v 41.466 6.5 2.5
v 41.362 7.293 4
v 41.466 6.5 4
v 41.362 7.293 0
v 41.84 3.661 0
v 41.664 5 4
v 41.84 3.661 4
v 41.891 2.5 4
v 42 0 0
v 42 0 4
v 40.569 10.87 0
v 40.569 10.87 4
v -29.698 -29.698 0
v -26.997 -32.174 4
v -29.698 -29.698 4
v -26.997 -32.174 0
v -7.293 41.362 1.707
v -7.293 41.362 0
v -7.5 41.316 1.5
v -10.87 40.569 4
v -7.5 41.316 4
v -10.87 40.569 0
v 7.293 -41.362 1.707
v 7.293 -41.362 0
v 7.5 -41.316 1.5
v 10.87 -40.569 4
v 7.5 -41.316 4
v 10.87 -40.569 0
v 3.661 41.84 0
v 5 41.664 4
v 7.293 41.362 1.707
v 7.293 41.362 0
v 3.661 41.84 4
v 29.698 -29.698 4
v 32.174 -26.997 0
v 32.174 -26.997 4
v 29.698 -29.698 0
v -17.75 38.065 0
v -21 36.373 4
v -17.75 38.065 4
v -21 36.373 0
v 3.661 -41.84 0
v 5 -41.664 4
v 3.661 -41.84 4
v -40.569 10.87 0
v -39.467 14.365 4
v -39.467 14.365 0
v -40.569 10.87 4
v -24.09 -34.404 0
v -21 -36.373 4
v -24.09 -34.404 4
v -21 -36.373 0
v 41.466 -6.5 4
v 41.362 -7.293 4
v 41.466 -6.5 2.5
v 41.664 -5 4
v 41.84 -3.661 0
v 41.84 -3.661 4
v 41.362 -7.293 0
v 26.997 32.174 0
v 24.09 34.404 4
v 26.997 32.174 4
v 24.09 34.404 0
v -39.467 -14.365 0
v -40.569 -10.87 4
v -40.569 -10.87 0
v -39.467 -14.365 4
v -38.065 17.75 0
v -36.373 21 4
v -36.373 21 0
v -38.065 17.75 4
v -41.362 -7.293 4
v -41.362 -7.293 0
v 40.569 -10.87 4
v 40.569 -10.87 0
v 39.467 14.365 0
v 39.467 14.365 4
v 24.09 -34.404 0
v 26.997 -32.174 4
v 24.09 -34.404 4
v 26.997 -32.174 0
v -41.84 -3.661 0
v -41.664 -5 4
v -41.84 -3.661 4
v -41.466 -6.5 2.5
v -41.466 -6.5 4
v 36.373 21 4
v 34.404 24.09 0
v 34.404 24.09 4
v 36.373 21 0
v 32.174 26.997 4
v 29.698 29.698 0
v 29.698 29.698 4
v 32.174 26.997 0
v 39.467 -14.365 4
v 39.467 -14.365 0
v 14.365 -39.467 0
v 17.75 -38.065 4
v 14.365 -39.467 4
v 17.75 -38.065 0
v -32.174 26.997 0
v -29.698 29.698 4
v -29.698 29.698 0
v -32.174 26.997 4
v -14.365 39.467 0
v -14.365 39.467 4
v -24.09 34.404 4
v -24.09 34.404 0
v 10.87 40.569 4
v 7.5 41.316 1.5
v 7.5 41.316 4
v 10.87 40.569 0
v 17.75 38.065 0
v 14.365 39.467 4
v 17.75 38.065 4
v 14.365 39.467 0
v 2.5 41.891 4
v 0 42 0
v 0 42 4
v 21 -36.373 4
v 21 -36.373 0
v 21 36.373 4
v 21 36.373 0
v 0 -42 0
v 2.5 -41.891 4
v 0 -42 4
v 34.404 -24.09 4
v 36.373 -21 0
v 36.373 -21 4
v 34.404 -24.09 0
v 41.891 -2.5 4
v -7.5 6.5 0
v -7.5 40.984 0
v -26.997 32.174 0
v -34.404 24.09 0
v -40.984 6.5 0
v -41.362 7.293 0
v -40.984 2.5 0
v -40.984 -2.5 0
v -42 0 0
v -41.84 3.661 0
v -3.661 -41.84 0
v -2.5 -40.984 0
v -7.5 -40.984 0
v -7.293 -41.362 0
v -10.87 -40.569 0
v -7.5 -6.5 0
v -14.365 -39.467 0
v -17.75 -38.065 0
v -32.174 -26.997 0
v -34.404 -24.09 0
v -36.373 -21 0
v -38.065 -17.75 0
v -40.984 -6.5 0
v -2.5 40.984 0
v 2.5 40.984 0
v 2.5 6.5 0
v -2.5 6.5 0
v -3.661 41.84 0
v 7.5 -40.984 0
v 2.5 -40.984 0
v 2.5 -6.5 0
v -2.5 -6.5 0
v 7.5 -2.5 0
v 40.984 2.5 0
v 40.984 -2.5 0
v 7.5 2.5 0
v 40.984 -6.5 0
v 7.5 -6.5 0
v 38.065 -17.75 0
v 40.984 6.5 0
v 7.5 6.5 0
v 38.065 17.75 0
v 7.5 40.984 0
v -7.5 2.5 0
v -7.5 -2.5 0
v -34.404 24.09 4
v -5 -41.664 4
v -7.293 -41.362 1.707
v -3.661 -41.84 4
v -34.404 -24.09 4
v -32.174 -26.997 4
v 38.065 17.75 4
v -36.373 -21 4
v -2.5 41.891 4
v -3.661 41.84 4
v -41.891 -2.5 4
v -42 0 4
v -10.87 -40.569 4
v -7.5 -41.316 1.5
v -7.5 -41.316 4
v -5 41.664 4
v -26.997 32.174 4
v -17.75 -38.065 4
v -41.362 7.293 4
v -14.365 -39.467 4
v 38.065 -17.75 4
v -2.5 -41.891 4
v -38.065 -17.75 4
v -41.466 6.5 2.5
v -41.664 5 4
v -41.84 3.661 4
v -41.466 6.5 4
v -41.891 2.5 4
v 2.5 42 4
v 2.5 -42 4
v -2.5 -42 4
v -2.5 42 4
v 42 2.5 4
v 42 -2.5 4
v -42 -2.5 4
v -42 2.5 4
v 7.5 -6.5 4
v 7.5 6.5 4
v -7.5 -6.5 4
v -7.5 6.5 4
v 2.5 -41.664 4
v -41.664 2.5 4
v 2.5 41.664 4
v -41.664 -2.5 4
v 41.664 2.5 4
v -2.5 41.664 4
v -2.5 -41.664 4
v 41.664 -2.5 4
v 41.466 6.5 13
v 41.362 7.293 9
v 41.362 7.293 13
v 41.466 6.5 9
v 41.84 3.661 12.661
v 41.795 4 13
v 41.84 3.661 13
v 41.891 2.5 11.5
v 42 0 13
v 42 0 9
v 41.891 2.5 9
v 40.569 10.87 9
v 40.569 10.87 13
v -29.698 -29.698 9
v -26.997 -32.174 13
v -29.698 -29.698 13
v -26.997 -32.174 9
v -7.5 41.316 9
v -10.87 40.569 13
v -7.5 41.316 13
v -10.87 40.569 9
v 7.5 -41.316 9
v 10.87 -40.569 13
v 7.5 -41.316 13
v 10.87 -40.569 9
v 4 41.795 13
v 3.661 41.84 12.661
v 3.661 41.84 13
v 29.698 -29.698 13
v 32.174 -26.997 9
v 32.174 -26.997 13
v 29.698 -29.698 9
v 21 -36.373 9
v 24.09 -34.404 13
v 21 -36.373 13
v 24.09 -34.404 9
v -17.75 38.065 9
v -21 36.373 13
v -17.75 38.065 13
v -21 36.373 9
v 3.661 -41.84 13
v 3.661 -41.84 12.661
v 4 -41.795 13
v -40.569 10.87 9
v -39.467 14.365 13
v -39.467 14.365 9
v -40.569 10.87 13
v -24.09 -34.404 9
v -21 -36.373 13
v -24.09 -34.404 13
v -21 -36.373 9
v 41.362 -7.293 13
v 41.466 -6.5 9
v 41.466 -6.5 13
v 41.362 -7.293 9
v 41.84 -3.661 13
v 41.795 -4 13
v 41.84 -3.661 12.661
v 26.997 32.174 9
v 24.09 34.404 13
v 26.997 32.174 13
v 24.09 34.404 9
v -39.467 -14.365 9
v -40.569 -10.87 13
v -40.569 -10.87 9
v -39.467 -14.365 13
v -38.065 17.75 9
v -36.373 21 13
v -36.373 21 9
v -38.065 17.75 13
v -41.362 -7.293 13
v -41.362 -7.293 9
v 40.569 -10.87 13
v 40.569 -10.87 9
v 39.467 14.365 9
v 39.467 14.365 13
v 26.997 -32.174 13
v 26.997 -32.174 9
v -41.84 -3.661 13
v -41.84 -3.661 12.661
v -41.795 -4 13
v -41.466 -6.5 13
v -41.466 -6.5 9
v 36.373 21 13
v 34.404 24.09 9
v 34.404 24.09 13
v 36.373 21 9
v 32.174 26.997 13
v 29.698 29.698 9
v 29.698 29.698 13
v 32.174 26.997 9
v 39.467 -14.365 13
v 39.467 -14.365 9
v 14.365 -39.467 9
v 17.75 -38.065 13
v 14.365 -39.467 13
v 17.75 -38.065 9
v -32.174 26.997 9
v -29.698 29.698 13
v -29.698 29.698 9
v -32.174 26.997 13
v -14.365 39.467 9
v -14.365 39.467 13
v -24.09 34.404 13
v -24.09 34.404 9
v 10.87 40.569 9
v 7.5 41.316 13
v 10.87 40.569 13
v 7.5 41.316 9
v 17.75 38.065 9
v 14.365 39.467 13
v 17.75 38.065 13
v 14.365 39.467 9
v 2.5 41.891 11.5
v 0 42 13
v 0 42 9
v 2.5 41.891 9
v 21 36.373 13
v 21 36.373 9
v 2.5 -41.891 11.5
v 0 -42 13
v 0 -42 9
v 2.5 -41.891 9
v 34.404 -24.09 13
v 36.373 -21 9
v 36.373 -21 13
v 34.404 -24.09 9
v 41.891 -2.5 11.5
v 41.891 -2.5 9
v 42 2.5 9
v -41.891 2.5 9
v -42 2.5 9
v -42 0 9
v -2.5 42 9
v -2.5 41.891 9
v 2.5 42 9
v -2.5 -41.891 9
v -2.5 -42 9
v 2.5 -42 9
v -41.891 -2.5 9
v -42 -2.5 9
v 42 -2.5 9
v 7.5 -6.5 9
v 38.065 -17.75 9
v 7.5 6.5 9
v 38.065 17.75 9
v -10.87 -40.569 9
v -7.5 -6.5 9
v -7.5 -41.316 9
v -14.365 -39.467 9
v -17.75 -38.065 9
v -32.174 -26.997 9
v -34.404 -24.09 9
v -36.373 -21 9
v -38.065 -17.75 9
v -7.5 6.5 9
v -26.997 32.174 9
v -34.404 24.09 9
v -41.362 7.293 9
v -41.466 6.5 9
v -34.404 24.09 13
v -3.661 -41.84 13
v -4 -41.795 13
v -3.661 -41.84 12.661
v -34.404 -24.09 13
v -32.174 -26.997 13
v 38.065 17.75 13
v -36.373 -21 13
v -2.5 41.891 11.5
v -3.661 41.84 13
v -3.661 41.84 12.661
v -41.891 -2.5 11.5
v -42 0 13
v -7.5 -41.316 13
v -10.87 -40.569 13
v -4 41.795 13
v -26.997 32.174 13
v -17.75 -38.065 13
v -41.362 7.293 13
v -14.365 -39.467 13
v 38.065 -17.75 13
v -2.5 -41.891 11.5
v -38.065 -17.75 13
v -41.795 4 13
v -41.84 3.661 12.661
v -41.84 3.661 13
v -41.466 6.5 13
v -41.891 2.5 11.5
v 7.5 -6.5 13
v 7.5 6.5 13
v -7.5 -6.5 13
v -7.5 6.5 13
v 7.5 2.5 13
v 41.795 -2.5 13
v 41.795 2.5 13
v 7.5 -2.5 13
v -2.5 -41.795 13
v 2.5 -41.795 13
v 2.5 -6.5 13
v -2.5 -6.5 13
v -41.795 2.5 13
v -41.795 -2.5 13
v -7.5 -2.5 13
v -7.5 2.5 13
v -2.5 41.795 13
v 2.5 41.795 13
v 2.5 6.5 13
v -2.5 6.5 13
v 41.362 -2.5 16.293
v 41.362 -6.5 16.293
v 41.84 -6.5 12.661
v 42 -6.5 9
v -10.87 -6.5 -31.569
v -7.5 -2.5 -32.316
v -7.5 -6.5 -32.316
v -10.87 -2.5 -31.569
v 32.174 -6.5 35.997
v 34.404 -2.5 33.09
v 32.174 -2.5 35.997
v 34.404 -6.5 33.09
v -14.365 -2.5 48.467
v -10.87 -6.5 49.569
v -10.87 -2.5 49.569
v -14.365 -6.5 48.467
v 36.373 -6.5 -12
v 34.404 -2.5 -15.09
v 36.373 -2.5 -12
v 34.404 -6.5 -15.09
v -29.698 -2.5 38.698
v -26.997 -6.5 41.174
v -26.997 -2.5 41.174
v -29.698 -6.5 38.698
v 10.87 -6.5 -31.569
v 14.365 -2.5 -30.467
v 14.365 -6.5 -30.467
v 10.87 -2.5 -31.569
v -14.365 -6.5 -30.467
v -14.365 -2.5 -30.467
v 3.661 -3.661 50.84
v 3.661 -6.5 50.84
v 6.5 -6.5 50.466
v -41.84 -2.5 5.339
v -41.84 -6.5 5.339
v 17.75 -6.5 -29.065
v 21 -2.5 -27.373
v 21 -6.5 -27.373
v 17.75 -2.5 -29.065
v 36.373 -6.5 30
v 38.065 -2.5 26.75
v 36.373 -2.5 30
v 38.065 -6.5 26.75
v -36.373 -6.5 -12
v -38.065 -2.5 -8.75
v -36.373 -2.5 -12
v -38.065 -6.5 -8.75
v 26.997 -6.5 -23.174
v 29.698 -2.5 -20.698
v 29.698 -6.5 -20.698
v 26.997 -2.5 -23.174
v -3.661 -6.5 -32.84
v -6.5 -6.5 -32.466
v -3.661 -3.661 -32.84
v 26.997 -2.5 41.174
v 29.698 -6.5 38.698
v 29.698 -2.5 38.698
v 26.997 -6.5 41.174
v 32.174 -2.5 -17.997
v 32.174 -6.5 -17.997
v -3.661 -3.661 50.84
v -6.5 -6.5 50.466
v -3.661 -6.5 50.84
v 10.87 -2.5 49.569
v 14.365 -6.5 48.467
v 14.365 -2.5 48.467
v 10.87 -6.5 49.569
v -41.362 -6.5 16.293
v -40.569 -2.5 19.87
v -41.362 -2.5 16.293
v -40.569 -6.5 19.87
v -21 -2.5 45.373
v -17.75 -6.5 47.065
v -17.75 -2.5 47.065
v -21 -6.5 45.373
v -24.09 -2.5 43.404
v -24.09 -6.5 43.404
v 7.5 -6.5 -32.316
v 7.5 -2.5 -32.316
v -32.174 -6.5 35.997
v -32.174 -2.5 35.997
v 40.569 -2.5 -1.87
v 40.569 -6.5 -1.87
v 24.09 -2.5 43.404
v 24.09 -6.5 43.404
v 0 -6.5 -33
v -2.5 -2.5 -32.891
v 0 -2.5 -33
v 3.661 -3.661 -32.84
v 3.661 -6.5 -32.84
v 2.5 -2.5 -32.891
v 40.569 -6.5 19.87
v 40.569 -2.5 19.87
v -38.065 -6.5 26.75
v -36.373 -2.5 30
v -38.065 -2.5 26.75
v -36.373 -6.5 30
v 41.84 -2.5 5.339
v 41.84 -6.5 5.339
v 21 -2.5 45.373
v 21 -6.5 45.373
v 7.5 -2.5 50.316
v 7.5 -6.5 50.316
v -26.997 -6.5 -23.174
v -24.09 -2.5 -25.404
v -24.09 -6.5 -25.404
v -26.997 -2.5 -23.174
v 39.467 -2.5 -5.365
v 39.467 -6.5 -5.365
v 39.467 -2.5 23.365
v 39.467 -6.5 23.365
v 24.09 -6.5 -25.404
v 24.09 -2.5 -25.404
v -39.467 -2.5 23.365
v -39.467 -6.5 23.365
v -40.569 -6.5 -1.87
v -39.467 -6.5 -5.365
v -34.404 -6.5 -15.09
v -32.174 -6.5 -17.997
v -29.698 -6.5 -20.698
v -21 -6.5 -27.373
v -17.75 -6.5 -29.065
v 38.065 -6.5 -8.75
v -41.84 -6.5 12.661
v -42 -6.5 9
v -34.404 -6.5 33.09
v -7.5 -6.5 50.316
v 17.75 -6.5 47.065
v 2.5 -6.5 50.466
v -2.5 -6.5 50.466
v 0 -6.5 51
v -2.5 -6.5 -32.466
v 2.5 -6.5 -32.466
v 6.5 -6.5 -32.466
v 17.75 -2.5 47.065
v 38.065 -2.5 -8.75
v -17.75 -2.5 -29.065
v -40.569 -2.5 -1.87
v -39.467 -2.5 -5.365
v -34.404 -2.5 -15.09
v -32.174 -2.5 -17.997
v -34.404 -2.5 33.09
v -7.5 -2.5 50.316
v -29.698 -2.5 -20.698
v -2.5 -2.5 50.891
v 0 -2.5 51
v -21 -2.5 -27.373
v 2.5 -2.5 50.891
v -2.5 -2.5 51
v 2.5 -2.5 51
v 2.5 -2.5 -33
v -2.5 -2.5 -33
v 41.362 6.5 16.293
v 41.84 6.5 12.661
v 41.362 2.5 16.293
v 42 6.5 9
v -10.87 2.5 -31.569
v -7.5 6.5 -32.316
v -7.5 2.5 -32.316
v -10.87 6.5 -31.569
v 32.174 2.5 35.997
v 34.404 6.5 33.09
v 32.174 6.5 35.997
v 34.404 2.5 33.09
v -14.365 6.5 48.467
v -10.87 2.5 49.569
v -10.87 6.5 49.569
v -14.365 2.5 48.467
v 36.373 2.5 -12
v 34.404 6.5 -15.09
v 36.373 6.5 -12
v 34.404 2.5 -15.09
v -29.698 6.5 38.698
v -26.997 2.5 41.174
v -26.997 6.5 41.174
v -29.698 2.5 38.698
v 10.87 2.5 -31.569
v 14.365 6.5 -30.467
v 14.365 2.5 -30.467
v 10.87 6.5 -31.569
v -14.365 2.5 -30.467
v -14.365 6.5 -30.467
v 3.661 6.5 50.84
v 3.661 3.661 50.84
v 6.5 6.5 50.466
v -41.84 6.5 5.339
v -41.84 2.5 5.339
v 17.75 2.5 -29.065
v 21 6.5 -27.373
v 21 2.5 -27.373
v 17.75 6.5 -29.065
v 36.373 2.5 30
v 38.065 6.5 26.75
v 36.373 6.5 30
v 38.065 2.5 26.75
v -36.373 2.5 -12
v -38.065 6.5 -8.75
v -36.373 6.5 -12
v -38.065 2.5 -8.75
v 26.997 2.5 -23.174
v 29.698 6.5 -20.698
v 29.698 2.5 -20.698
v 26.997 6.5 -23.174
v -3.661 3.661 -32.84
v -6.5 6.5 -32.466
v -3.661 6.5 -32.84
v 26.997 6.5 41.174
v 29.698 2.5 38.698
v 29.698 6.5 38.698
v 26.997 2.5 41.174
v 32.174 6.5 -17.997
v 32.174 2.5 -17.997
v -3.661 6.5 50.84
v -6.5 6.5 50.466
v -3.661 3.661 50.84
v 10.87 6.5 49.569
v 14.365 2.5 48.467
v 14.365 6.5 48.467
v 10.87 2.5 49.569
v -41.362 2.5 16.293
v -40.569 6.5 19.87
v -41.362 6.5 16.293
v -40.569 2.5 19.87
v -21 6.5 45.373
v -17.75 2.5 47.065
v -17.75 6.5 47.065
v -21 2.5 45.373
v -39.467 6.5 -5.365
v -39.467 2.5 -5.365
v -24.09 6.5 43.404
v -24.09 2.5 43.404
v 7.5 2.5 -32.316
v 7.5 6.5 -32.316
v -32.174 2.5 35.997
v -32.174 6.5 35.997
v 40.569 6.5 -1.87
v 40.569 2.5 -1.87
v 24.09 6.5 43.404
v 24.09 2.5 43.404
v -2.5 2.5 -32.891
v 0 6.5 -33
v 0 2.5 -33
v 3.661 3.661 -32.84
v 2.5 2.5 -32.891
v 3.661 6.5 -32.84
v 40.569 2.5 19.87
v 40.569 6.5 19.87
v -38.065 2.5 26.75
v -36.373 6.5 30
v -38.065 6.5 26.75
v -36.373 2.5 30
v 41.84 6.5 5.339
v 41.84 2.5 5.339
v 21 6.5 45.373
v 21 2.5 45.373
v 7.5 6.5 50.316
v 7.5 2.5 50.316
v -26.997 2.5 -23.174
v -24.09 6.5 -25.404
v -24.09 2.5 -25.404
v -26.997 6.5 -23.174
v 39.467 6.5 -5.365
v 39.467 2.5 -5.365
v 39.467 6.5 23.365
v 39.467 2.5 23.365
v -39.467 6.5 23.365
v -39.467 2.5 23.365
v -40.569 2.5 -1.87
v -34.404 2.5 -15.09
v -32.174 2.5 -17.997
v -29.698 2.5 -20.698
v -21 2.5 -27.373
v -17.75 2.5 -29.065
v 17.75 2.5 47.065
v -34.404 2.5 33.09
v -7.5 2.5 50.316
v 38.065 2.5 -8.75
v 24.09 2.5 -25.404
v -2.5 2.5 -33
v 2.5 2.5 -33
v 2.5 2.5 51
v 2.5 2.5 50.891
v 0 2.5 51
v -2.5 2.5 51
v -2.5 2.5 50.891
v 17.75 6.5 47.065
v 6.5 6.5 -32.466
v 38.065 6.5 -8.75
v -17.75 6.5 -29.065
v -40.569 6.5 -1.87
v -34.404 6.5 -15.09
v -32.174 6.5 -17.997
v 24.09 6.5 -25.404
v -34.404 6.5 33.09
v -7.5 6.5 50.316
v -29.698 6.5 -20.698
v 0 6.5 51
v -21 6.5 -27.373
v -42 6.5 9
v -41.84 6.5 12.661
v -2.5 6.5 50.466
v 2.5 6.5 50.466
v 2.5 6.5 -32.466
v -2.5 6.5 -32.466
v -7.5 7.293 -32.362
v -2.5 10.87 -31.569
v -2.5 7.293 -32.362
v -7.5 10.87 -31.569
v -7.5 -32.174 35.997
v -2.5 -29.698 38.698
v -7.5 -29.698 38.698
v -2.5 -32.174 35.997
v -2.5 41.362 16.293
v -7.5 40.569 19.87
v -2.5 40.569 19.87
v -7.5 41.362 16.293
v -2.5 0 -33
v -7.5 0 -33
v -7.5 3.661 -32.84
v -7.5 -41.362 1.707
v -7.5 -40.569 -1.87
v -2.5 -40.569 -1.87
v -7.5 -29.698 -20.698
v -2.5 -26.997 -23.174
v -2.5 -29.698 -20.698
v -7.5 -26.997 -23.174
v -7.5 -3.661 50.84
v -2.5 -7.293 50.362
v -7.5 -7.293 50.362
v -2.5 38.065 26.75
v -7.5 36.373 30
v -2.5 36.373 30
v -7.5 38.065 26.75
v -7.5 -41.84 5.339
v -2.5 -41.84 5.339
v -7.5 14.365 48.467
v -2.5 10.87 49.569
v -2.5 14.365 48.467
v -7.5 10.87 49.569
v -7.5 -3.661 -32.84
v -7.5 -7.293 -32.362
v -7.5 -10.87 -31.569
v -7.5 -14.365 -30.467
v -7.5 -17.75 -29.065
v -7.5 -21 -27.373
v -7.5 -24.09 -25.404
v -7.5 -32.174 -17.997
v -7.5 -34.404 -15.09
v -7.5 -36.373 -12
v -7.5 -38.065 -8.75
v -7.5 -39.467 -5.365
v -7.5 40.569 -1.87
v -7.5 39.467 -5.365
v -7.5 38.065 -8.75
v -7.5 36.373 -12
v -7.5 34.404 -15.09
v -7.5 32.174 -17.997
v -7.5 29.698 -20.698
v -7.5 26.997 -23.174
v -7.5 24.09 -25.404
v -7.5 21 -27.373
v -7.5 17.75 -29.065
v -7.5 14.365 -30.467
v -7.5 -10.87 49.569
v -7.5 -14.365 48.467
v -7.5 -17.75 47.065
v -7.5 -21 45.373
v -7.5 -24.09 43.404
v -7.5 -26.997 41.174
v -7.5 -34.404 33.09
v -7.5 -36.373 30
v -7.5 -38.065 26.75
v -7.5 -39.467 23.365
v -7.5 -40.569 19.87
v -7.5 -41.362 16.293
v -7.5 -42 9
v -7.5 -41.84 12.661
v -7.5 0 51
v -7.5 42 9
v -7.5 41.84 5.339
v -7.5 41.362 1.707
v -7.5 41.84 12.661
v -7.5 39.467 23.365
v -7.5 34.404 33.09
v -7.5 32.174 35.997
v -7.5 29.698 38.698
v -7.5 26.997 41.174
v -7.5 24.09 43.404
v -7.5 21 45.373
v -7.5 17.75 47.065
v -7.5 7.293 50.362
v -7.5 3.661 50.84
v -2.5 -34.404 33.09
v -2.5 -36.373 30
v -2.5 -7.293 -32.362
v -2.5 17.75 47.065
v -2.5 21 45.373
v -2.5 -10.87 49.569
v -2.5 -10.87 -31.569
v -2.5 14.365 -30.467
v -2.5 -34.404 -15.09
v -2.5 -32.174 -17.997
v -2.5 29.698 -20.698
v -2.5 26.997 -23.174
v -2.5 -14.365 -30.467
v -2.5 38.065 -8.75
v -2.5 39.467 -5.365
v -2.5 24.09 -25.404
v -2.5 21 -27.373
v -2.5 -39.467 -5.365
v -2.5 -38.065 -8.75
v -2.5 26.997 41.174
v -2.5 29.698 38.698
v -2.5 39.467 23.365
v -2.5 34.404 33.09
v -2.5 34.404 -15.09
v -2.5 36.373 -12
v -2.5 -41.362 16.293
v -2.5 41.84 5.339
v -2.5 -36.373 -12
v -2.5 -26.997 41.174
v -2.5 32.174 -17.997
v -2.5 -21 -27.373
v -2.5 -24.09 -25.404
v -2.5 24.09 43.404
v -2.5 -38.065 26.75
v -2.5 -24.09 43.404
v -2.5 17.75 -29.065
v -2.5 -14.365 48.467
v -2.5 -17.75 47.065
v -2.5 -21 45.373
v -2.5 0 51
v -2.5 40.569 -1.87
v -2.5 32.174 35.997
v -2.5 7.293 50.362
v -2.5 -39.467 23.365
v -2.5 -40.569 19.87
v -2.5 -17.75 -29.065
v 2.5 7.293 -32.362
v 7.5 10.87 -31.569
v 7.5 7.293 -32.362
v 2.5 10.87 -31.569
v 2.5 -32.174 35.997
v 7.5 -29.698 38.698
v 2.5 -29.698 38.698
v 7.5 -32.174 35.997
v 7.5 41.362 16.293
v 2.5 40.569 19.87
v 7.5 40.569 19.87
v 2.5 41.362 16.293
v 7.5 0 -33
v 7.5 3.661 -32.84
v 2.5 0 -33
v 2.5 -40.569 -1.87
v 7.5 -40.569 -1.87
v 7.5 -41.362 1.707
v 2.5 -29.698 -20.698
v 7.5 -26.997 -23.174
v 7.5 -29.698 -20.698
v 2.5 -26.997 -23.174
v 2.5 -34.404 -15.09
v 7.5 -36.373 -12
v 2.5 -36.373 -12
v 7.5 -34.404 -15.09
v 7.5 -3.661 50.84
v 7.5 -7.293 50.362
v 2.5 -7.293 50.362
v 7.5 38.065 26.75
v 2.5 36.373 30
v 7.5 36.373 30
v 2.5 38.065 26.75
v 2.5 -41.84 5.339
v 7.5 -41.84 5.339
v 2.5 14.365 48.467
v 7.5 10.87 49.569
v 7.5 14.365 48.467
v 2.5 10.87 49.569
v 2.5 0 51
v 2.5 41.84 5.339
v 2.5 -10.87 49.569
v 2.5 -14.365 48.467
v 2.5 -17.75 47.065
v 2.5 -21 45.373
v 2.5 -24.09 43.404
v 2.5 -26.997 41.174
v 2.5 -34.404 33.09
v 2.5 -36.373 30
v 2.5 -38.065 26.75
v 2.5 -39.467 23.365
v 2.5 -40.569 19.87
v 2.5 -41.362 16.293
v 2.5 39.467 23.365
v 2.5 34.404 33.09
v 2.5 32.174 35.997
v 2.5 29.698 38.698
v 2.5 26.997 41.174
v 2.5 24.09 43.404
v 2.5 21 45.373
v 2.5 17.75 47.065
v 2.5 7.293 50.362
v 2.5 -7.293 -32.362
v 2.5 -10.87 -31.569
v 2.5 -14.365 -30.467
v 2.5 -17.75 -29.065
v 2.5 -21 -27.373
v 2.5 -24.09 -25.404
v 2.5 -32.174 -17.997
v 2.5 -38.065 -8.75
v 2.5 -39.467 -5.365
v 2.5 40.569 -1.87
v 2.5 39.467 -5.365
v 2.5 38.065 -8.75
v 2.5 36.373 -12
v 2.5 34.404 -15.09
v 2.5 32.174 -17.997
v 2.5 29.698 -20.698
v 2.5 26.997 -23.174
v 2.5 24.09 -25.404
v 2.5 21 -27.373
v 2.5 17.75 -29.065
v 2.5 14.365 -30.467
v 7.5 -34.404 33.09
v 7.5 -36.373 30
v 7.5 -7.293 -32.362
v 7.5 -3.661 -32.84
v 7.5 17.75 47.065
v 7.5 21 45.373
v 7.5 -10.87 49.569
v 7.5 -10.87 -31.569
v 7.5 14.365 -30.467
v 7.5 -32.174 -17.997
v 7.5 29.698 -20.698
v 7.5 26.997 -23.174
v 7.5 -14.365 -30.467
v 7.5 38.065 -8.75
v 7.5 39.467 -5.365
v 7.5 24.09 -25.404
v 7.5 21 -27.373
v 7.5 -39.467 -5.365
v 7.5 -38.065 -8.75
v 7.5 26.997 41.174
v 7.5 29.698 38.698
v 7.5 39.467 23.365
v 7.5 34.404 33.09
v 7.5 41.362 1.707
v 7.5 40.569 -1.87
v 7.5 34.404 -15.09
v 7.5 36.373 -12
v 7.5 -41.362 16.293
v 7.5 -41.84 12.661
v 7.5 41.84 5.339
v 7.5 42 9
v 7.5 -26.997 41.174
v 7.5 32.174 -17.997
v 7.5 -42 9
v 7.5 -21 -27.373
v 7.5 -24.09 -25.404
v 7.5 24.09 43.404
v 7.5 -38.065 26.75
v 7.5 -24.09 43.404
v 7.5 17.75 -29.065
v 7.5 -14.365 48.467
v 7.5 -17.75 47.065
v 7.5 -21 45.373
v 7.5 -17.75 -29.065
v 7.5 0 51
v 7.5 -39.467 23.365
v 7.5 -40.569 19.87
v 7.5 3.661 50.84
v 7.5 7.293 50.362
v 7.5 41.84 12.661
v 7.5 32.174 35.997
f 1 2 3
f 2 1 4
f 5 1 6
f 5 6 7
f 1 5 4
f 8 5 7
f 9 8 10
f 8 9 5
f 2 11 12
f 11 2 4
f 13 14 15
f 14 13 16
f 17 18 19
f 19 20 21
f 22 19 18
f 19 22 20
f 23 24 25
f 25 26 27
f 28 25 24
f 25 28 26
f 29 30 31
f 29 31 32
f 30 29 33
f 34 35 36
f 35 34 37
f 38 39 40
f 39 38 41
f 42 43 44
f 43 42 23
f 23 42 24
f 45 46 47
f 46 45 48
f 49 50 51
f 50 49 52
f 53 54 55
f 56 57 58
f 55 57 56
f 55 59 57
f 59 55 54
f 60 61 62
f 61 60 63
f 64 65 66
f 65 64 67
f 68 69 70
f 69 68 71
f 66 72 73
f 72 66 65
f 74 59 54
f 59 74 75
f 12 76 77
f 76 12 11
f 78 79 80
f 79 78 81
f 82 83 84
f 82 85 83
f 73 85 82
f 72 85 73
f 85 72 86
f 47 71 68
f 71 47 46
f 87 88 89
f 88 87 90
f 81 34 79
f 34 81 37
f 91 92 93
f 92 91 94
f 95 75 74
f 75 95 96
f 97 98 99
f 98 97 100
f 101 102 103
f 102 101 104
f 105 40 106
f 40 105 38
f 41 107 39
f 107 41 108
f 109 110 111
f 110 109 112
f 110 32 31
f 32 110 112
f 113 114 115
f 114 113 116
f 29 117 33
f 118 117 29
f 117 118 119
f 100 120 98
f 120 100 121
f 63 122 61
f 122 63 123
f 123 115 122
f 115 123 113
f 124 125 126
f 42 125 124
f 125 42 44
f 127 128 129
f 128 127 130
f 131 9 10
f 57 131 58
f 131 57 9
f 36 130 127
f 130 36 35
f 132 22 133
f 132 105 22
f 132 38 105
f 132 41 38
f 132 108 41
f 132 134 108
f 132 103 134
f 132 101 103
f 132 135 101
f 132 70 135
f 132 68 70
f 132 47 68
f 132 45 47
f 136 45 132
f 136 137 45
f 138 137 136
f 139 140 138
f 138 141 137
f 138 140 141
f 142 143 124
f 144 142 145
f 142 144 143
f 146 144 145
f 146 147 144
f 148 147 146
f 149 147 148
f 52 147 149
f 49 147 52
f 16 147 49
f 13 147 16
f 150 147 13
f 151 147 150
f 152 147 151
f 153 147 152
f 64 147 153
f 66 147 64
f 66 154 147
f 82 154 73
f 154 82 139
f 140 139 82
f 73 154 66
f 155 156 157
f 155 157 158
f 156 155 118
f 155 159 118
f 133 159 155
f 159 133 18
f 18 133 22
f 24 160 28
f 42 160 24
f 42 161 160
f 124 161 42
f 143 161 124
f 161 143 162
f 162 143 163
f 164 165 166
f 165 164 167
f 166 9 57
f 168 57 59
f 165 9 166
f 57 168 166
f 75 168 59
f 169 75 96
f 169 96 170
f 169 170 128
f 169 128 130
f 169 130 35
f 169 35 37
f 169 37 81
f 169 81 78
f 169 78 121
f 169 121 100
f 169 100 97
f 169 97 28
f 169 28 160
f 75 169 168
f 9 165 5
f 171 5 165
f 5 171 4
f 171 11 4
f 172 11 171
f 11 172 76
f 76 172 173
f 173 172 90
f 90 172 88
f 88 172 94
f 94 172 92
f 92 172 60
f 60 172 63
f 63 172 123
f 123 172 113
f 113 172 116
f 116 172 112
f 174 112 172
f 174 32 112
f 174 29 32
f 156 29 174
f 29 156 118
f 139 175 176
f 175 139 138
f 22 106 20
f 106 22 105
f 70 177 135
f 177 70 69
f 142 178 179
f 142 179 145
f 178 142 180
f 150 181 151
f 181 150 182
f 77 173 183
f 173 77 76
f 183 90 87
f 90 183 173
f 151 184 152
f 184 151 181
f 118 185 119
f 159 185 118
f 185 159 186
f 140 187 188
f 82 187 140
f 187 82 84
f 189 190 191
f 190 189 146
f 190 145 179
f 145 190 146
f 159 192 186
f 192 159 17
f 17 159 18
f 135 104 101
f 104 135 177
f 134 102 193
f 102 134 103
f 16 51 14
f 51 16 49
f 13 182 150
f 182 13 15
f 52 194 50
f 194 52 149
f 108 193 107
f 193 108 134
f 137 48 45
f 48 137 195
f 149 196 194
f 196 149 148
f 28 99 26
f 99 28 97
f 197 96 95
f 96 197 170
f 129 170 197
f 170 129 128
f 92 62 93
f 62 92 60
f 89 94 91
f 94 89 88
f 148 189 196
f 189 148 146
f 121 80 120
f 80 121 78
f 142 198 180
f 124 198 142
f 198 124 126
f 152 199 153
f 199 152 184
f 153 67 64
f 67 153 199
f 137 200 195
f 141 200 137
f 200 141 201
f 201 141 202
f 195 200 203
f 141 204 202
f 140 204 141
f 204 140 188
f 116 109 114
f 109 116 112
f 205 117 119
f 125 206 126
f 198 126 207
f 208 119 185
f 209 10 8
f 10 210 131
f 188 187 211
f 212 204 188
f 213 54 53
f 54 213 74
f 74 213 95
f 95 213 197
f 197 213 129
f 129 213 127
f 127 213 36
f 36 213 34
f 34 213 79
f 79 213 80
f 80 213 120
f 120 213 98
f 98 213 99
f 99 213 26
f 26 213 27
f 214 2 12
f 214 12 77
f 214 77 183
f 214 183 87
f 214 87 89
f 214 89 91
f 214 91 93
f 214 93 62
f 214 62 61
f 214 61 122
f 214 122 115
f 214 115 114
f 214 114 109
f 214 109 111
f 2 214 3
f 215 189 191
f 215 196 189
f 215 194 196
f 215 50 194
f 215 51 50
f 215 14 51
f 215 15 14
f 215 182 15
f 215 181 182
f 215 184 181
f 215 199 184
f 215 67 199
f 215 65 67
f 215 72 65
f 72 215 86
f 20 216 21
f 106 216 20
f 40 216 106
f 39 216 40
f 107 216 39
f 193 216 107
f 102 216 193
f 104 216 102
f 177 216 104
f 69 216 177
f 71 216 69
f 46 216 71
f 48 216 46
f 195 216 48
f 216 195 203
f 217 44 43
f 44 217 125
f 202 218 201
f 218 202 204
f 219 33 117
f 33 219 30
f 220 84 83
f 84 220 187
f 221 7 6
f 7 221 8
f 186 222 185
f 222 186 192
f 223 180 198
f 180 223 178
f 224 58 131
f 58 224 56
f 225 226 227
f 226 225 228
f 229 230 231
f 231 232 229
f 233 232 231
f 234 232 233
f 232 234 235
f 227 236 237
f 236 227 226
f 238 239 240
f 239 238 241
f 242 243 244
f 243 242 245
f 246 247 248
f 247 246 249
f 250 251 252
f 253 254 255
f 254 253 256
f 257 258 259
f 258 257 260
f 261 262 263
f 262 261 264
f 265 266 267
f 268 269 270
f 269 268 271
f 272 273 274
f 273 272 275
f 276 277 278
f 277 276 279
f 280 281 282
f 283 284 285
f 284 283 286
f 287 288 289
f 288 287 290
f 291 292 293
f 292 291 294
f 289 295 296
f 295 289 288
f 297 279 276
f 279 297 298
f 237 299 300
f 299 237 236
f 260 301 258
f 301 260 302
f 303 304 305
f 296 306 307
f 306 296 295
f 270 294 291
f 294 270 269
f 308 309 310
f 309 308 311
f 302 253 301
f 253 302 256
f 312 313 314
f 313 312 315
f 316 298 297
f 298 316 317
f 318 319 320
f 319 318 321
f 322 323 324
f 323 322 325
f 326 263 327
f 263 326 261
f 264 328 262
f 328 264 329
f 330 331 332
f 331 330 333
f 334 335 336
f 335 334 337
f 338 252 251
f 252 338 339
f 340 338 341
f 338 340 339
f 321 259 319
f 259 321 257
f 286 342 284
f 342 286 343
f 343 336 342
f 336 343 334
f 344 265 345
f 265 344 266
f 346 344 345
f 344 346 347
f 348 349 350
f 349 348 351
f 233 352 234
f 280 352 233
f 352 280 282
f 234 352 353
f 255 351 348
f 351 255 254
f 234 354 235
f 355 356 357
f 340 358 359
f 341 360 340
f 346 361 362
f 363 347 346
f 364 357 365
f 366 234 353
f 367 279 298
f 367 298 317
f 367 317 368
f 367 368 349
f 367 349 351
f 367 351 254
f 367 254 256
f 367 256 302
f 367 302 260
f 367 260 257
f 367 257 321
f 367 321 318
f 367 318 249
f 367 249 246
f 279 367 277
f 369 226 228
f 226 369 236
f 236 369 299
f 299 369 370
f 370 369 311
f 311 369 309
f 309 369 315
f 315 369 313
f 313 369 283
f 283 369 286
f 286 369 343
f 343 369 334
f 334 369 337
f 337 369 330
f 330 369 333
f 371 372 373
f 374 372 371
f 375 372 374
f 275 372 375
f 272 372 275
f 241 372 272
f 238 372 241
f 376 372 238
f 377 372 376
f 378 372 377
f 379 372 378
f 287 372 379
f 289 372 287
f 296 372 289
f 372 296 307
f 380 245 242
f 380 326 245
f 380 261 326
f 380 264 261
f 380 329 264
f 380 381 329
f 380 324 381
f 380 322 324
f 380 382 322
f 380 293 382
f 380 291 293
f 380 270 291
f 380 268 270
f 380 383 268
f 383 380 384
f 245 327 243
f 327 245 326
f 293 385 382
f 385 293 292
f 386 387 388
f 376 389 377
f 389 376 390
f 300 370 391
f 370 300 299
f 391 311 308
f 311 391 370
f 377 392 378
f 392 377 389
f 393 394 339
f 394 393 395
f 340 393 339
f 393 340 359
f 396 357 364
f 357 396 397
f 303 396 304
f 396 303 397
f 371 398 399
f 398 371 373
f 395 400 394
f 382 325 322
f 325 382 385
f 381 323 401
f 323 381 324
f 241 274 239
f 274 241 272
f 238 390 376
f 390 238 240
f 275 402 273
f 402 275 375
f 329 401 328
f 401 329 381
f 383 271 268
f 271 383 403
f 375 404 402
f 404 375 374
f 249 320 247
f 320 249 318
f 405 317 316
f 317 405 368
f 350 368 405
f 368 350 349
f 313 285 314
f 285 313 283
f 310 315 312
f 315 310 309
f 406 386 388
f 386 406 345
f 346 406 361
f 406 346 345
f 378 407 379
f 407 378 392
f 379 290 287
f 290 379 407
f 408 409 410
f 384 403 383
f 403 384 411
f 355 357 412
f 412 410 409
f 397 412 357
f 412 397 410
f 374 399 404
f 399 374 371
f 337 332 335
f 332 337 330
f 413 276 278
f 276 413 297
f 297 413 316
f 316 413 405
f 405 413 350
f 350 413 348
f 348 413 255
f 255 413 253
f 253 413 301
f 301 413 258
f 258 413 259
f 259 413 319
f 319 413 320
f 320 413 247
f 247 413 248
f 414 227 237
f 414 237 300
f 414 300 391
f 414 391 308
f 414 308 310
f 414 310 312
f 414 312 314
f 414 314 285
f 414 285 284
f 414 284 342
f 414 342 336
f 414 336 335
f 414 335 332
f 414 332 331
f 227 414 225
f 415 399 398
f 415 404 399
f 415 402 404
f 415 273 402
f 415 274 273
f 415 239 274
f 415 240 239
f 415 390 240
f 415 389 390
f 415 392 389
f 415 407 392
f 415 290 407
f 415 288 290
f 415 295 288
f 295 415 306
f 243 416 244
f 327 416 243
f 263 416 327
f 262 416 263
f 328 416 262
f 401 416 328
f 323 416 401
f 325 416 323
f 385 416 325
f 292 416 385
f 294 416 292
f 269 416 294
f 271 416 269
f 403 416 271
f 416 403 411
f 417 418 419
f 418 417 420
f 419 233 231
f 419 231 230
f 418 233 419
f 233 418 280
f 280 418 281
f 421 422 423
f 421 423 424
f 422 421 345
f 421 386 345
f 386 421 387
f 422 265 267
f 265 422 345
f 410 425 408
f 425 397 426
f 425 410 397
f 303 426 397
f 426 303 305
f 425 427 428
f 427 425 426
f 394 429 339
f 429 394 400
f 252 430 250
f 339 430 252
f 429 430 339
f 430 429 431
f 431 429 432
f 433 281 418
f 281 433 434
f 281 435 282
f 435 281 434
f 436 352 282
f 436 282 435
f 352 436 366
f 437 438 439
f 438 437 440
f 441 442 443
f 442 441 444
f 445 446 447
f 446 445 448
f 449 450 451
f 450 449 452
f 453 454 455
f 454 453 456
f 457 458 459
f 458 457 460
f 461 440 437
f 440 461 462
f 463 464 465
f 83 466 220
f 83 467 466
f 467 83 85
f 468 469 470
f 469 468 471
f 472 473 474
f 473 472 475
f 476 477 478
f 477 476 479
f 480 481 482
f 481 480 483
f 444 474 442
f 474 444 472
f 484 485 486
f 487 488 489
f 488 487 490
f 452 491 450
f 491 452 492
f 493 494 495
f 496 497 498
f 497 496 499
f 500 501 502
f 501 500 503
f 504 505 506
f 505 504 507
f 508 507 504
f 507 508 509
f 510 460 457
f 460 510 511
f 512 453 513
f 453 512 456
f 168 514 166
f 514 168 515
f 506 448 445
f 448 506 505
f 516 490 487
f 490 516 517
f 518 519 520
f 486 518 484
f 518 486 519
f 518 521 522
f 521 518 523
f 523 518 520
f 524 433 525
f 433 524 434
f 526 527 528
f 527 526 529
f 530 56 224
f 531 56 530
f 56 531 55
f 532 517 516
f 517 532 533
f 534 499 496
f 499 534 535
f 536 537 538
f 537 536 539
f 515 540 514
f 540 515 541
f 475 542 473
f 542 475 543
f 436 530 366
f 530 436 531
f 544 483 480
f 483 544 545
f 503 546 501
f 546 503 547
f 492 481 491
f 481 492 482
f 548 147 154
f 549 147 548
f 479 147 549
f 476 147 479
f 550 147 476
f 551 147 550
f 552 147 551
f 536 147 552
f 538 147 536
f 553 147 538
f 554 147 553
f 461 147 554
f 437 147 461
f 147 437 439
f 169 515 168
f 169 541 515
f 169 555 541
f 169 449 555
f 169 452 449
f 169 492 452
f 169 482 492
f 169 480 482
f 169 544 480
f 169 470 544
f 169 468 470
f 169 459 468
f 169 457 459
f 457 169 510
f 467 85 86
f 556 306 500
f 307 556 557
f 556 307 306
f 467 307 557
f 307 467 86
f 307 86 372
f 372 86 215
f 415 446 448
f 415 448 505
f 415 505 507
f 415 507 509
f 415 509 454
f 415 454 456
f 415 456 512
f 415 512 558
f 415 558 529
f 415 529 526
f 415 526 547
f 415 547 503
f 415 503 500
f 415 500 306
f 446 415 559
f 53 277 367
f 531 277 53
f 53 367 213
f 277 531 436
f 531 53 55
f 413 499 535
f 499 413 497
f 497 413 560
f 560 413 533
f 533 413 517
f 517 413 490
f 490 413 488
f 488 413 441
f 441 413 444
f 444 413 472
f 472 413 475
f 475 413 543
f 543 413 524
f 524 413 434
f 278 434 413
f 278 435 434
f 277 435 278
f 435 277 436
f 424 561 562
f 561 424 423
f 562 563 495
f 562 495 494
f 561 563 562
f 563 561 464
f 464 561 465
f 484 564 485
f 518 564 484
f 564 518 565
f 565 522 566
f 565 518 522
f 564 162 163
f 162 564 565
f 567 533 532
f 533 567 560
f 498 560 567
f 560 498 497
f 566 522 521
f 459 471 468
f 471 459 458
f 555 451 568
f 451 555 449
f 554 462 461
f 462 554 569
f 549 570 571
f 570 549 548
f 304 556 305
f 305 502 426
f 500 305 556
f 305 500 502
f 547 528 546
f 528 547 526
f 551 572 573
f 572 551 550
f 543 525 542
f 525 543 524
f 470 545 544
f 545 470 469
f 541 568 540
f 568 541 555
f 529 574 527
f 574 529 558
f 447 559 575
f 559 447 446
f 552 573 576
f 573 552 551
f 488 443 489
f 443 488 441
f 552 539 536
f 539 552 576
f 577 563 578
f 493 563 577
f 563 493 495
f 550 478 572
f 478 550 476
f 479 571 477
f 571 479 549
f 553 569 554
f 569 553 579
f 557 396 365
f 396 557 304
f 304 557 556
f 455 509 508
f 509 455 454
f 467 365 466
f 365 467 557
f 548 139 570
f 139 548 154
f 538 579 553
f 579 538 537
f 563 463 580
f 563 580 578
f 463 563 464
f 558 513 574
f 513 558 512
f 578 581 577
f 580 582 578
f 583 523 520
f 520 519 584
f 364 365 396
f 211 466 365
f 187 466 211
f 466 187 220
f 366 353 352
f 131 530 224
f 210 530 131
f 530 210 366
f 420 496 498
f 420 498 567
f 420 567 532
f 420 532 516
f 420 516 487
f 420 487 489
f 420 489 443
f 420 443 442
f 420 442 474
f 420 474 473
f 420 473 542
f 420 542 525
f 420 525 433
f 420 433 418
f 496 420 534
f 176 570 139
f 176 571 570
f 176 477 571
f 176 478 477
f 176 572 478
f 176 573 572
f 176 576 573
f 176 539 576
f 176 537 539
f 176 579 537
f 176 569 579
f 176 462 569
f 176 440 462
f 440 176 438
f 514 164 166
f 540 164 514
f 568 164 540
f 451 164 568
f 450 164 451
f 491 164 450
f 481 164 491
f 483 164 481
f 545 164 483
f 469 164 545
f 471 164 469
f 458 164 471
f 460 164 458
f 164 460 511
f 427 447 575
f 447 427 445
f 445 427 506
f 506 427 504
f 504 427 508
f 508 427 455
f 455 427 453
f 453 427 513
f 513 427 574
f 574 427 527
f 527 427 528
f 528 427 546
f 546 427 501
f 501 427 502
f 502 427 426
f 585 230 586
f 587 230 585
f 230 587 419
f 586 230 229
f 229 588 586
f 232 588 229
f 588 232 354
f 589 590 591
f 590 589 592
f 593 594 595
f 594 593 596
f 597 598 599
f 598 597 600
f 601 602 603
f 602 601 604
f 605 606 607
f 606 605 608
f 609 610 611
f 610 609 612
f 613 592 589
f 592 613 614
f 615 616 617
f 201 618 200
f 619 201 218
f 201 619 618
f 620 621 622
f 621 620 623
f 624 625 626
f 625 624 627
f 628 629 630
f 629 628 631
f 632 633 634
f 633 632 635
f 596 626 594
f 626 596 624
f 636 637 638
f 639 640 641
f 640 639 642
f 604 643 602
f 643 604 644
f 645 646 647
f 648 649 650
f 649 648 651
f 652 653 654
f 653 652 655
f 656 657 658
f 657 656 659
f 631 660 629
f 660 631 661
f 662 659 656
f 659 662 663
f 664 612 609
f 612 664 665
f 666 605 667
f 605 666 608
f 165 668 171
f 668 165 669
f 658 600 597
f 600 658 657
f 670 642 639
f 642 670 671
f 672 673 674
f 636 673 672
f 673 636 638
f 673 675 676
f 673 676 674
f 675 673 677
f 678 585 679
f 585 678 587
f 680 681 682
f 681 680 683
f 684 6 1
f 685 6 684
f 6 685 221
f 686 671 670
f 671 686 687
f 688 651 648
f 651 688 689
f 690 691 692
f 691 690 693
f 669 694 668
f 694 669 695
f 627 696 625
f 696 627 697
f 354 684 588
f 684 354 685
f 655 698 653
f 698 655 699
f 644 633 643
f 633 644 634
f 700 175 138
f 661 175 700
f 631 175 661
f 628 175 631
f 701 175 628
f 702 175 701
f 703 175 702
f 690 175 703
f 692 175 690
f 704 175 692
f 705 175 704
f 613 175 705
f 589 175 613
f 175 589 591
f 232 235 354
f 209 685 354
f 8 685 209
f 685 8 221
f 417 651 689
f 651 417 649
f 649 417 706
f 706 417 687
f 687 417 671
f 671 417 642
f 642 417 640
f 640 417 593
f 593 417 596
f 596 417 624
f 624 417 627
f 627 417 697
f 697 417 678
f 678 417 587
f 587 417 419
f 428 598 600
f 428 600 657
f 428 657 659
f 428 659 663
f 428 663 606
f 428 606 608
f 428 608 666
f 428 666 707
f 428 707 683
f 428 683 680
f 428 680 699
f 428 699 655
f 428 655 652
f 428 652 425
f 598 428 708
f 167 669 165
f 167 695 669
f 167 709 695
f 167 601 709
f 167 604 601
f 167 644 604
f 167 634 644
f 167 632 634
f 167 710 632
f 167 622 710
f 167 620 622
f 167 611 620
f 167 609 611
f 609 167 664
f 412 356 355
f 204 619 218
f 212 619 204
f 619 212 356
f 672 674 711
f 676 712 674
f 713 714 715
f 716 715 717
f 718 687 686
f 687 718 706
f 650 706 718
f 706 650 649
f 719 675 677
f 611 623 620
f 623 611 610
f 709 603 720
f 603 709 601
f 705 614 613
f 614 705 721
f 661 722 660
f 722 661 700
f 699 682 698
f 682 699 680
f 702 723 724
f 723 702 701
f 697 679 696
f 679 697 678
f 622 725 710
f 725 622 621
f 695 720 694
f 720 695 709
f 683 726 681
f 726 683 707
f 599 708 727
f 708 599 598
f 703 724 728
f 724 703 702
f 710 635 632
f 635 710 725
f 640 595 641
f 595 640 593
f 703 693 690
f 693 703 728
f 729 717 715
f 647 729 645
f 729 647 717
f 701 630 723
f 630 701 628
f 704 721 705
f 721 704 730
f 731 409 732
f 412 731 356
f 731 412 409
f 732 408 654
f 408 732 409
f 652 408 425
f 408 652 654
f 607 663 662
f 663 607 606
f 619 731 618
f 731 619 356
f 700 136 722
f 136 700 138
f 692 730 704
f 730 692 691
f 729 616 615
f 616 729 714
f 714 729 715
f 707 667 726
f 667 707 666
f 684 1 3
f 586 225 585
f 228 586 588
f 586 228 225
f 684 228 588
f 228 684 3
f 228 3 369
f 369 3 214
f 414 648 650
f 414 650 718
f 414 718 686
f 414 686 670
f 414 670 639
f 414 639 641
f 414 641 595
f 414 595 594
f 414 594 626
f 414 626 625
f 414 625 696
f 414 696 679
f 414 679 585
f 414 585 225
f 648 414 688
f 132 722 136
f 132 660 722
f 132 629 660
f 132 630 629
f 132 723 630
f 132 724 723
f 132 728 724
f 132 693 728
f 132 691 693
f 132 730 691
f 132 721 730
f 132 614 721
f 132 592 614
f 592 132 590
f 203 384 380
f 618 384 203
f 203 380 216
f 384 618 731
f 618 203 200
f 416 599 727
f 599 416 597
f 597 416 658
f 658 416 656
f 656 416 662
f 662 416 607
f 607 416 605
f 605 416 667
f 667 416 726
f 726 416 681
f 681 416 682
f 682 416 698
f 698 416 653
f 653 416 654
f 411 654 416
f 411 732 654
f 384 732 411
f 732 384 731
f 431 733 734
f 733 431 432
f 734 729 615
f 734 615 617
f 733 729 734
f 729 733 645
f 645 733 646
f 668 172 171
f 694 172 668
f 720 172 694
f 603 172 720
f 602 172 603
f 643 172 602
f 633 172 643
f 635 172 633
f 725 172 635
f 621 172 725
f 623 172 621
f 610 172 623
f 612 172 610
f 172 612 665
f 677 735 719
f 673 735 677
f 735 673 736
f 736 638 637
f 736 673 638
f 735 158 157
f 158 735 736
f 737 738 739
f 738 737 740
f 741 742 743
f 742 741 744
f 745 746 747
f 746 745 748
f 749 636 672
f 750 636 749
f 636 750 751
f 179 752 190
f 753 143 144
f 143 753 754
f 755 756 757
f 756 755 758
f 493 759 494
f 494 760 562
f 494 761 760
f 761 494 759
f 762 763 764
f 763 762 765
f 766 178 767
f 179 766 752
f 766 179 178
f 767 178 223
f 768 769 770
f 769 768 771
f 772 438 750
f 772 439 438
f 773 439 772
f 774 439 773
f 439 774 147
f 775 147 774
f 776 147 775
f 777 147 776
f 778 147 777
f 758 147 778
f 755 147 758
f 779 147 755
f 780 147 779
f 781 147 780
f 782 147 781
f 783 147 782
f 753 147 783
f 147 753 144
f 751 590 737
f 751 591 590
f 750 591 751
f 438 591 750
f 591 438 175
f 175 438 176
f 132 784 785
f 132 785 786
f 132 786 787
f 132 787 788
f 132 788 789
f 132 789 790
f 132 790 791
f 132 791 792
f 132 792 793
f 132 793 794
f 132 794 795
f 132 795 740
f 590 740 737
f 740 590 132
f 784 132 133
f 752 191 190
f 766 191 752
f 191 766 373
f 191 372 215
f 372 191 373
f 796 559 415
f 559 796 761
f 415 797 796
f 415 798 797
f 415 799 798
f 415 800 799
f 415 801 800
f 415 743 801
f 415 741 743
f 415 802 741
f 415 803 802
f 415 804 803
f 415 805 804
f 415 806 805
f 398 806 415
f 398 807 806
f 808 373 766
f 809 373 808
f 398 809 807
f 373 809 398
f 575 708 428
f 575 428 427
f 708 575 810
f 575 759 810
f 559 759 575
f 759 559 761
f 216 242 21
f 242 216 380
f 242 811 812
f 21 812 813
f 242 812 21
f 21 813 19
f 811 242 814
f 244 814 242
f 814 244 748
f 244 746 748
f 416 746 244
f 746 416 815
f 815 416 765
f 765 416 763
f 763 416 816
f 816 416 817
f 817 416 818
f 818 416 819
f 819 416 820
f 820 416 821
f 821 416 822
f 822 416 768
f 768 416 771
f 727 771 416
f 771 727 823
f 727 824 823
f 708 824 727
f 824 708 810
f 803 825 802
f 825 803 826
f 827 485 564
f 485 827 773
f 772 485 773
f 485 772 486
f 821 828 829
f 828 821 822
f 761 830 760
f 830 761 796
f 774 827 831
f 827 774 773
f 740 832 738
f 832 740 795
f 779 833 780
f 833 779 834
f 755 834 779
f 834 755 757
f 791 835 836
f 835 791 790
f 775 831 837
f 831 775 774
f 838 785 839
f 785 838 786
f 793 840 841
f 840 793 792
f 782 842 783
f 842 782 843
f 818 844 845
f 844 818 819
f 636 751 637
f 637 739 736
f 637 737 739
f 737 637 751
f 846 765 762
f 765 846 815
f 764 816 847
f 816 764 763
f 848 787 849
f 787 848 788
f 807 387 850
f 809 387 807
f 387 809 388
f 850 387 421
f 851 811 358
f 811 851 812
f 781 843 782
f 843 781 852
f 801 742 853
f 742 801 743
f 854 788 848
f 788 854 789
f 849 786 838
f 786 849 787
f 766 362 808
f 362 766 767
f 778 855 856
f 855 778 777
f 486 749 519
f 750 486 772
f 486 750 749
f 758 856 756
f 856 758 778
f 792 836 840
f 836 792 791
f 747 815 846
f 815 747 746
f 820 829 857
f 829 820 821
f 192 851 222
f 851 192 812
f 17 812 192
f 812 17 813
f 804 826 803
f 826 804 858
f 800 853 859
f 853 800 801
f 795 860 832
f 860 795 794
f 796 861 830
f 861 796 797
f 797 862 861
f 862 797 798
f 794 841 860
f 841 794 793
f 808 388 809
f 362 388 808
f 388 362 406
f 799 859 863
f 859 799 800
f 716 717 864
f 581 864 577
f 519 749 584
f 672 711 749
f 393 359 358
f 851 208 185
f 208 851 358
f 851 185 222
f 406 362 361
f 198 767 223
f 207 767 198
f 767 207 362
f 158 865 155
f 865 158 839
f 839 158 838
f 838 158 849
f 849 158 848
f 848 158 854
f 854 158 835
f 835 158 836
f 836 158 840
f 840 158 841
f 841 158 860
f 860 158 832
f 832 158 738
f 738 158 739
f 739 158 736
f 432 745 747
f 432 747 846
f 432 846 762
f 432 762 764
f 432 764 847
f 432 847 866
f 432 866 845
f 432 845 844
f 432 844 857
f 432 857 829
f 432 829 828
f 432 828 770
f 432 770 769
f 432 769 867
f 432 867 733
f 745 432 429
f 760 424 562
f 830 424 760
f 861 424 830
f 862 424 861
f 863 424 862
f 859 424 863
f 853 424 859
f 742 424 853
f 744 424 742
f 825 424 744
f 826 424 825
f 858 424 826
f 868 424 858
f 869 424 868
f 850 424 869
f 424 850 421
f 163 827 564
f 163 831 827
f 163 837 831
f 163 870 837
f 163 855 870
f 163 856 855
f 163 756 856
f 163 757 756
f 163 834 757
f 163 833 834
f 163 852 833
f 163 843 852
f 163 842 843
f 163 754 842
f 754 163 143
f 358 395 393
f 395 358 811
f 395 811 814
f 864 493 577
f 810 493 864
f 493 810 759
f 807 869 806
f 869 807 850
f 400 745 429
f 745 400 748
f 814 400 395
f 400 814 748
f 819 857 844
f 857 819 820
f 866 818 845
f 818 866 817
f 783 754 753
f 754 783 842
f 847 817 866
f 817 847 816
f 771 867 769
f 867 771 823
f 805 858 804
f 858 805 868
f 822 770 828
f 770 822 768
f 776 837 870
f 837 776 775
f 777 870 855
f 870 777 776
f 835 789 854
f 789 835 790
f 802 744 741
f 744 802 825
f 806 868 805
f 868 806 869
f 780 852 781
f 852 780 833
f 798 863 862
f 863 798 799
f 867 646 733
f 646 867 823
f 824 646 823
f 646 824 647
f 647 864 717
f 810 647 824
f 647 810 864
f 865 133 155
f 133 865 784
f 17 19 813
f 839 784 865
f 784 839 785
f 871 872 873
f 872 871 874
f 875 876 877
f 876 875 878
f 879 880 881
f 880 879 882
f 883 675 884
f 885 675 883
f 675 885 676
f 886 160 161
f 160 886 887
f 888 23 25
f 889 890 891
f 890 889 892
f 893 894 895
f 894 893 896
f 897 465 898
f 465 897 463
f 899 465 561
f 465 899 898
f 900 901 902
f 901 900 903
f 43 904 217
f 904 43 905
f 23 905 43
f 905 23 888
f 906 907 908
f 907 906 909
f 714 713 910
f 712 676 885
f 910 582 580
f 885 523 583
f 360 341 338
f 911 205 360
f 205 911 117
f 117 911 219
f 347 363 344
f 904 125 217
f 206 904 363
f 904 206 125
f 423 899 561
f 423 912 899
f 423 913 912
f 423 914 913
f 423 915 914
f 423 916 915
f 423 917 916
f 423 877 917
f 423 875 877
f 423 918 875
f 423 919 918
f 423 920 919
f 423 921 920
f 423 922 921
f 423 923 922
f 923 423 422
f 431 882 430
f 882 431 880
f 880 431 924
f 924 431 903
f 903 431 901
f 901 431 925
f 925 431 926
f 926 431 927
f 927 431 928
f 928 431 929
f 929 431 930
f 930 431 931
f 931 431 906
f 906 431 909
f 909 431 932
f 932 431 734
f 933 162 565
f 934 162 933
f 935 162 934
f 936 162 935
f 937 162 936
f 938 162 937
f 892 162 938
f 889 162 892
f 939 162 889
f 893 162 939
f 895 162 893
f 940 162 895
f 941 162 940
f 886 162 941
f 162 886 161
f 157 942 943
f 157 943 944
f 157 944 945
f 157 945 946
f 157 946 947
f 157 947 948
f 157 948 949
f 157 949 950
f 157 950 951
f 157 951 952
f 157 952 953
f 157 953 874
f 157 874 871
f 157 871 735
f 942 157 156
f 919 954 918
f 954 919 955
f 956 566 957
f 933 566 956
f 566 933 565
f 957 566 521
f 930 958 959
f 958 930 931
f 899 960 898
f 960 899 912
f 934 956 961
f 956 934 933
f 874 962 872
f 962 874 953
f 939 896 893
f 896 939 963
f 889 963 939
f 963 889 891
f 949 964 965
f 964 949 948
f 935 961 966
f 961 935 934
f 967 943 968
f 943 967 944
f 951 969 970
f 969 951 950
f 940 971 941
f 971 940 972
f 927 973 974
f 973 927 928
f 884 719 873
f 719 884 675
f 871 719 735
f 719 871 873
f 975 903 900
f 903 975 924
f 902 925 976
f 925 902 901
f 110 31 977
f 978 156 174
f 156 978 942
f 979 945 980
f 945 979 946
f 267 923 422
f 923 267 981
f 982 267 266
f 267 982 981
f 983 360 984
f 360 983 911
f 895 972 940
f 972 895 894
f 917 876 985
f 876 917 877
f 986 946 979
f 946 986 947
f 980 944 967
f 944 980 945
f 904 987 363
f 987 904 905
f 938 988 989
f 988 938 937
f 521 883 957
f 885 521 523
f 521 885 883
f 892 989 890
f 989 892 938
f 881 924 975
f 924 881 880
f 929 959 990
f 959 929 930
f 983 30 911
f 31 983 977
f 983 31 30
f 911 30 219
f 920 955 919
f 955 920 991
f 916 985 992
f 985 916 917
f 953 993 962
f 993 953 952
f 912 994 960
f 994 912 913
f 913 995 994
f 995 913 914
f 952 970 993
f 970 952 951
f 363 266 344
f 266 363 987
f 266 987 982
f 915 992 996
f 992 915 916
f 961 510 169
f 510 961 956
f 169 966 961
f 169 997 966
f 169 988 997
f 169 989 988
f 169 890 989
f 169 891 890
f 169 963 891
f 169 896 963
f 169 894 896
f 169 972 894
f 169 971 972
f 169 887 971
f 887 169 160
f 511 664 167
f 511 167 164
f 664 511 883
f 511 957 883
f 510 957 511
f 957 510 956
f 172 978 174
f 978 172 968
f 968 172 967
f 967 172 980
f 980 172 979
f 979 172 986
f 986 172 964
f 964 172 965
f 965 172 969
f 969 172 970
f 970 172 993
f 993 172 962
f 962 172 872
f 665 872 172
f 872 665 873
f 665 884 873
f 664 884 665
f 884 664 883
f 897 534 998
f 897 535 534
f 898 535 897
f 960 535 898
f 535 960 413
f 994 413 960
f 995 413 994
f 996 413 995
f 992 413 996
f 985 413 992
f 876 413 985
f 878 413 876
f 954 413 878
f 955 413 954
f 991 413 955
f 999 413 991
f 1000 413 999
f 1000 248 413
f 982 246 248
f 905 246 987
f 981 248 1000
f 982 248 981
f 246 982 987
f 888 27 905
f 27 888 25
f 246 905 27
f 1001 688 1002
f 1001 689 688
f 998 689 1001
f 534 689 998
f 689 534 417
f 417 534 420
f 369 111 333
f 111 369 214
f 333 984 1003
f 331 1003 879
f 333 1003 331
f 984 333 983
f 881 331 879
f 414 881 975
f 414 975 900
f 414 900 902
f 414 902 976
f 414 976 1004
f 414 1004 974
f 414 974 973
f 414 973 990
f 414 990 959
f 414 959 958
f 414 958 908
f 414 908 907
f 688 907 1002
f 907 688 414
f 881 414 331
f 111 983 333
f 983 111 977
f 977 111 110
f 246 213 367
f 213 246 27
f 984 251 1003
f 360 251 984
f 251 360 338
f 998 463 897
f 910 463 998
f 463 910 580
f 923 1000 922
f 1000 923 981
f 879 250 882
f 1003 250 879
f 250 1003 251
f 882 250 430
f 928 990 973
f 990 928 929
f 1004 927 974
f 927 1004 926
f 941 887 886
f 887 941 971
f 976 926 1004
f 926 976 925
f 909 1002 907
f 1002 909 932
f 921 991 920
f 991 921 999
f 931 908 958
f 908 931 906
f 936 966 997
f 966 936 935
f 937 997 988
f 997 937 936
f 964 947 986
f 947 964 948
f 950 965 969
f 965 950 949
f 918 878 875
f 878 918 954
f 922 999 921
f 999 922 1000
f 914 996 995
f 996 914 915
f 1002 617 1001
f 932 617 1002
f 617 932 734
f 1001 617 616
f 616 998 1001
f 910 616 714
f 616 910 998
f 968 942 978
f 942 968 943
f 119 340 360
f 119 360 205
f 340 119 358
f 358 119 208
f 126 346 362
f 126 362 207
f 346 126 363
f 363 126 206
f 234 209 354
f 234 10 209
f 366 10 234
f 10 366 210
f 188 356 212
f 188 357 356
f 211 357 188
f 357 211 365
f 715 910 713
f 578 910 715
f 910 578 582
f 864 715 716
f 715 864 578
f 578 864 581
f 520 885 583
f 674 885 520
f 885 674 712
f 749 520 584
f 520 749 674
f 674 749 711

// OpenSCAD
wireshelf_bracket();


module wireshelf_bracket()
{


translate([0,0,0]) cylinder(4,42,42, $fa=5, $fs=0.1);  // bottom cylinder
translate([0,0,4+5]) cylinder(4,42,42, $fa=5, $fs=0.1);  // top cylinder, offset 4 plus spacing of 5mm


translate([0,0-2.5,9]) rotate([90,0,0]) cylinder(4,42,42, $fa=5, $fs=0.1);  //  Y side cylinder 1
translate([0,4+2.5,9]) rotate([90,0,0]) cylinder(4,42,42, $fa=5, $fs=0.1);  //  Y side cylinder 2



translate([-5-2.5,0,9]) rotate([0,90,0]) cylinder(5,42,42,$fa=5, $fs=0.1);  // X side cylinder 1
translate([0+2.5,0,9]) rotate([0,90,0]) cylinder(5,42,42, $fa=5, $fs=0.1);  // X side cylinder 2



// add a rectangle in to make the center solid 
// this can be done as the intersection of the 4 cylinders....
// or as a couple of rectangles that get translated


//rectangles that get tranlated to fill in btwn intersections

translate([-2.5,-42,4]) cube([5,84,5]);          // Y axis filler rod
translate([-42,-2.5,4])  cube([84,5,5]);       // X axis filler rod  (shift up by height of Cylinder)
translate([-2.5,-2.5,-33])  cube([5,5,84]);  // Z axis filler rod

}
